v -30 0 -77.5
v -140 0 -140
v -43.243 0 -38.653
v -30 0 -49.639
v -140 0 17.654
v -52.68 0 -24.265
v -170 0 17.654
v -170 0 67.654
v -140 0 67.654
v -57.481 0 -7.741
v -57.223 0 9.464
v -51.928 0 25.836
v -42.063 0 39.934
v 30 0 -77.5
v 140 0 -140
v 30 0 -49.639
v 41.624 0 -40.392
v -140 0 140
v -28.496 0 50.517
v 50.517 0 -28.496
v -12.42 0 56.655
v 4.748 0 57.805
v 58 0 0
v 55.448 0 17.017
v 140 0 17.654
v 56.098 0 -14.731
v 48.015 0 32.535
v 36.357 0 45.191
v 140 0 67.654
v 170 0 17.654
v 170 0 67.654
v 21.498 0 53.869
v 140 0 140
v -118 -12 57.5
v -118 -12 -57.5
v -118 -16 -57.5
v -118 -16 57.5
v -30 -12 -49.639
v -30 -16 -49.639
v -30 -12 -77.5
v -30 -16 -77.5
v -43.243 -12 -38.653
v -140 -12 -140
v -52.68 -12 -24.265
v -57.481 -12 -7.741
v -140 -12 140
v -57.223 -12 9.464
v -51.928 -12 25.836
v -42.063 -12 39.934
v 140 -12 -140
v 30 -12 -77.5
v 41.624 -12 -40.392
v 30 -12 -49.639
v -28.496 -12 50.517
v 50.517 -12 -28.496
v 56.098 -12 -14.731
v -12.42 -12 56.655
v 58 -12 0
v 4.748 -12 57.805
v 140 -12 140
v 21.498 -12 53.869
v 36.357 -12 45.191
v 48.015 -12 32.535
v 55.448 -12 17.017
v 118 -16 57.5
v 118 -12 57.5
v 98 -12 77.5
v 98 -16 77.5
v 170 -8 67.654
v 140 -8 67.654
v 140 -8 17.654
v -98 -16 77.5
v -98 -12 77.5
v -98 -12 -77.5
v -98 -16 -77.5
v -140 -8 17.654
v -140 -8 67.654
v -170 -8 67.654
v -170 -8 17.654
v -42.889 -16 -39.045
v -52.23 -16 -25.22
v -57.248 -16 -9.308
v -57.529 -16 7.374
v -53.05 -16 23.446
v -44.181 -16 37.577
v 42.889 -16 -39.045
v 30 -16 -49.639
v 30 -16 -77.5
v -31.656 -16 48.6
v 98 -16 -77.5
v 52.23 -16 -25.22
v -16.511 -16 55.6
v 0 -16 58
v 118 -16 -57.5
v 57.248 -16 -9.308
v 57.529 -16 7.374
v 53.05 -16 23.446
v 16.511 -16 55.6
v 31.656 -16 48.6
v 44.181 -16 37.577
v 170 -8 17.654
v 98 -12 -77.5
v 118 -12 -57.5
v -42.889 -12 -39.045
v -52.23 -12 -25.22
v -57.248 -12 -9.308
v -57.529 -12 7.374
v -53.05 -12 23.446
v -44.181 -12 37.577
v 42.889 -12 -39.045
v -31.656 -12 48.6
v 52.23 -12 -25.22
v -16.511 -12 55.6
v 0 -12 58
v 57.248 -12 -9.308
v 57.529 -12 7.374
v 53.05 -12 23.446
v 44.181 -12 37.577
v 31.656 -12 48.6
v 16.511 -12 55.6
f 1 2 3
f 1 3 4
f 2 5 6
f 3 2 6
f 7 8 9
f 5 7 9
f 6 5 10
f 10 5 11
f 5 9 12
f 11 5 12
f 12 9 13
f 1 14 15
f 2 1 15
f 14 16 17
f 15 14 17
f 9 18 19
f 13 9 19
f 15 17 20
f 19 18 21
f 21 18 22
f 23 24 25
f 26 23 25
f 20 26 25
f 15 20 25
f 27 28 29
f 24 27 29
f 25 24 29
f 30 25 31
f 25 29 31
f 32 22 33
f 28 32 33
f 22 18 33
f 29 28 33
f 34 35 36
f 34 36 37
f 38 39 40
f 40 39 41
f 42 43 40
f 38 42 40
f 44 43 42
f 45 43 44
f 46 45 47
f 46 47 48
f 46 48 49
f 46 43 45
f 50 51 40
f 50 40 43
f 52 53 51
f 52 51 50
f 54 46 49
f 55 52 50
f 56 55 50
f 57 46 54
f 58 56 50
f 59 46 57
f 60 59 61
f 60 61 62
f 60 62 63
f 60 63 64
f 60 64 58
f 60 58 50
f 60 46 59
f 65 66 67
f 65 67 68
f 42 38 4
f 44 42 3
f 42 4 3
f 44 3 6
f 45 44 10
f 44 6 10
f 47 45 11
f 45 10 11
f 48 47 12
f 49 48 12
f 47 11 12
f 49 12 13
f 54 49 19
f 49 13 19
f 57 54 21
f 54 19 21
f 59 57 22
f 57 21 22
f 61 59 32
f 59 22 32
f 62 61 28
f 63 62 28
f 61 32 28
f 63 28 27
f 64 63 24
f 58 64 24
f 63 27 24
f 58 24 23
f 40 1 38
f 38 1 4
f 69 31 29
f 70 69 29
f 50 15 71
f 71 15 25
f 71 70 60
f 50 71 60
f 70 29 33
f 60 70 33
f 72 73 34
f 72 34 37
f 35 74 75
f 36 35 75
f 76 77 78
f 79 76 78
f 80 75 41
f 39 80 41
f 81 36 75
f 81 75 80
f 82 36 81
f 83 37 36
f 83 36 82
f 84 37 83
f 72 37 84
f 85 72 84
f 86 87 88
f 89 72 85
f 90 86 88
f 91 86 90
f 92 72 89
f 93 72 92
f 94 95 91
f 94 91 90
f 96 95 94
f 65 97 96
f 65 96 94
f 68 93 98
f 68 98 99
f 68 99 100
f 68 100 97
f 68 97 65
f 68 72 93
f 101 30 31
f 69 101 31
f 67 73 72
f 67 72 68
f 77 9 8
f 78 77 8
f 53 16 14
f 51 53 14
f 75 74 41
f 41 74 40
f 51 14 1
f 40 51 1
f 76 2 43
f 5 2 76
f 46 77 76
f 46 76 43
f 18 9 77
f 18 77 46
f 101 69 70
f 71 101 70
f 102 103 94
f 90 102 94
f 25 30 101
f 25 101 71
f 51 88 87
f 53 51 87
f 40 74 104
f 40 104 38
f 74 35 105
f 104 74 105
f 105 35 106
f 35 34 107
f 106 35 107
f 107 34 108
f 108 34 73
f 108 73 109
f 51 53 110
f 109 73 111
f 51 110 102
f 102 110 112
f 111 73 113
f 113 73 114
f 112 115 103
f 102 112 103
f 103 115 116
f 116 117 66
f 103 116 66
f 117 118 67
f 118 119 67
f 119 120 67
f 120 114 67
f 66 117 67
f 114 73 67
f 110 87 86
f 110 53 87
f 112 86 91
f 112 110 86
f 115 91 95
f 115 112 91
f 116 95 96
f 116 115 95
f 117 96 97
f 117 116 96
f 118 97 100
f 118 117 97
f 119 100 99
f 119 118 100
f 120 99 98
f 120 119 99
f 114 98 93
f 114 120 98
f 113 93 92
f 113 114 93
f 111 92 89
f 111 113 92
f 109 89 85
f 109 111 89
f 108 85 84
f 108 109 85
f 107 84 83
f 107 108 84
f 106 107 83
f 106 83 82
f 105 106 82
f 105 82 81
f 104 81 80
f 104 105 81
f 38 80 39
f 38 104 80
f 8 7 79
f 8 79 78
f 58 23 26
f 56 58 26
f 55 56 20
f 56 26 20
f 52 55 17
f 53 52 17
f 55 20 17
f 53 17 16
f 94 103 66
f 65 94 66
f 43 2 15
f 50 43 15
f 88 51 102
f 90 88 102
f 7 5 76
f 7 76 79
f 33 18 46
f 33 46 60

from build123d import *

# Parameters (mm, degrees)
F0_W     = 280
F0_H     = 280
F1_DEPTH = 12
F2_W     = 236
F2_H     = 155
F2_R     = 58
F3_DEPTH = 4
F4_SIZE  = 20
F5_W     = 30
F5_H     = 50
F6_DEPTH = 8
F8_DEPTH = 16.001
F9_DEPTH = 449


# Not quite as in the source:
# - an extrude ends at something that could not be found from the text; its depth is read off the source's solid


with BuildPart() as f1:
    # F0 (on Front) → F1 (new body)
    with BuildSketch(Plane.XZ):
        Rectangle(F0_W, F0_H)
        with BuildLine():
            ThreePointArc((-30, -49.638694584), (-28.4956136976, 50.5173237613), (58, 0))
            ThreePointArc((58, 0), (50.5173237613, -28.4956136976), (30, -49.638694584))
            Line((30, -49.638694584), (30, -77.5))
            Line((30, -77.5), (-30, -77.5))
            Line((-30, -77.5), (-30, -49.638694584))
        make_face(mode=Mode.SUBTRACT)
    extrude(amount=F1_DEPTH)

    # F5 (on face) → F6 (join)
    with BuildSketch(Plane(origin=(0, 0, 0), x_dir=(-1, 0, 0), z_dir=(0, 1, 0))):
        with Locations((-155, 42.6539830863)):
            Rectangle(F5_W, F5_H)
        with Locations((155, 42.6539830863)):
            Rectangle(F5_W, F5_H)
    extrude(amount=-F6_DEPTH)

    # F0 (on Front) → F9 (cut, through all)
    with BuildSketch(Plane.XZ):
        with BuildLine():
            ThreePointArc((30, -49.638694584), (0, -58), (-30, -49.638694584))
            Line((-30, -49.638694584), (-30, -77.5))
            Line((-30, -77.5), (30, -77.5))
            Line((30, -77.5), (30, -49.638694584))
        make_face()
    extrude(amount=-F9_DEPTH, mode=Mode.SUBTRACT)


with BuildPart() as f3:
    # F2 (on face) → F3 (new body)
    with BuildSketch(Plane.XZ.offset(12)):
        Rectangle(F2_W, F2_H)
        Circle(F2_R, mode=Mode.SUBTRACT)
    extrude(amount=F3_DEPTH)

    # F4
    f4_edges = [f3.edges().sort_by_distance(p)[0] for p in [
        (118, -14, -77.5),
        (-118, -14, -77.5),
        (118, -14, 77.5),
        (-118, -14, 77.5),
    ]]
    chamfer(f4_edges, length=F4_SIZE)

    # F7 (on face) → F8 (cut, through all)
    with BuildSketch(Plane.XZ.offset(16)):
        with BuildLine():
            ThreePointArc((30, -49.638694584), (0, -58), (-30, -49.638694584))
            Line((-30, -49.638694584), (-30, -77.5))
            Line((-30, -77.5), (30, -77.5))
            Line((30, -77.5), (30, -49.638694584))
        make_face()
    extrude(amount=-F8_DEPTH, mode=Mode.SUBTRACT)


solid = Compound([f1.part, f3.part])
